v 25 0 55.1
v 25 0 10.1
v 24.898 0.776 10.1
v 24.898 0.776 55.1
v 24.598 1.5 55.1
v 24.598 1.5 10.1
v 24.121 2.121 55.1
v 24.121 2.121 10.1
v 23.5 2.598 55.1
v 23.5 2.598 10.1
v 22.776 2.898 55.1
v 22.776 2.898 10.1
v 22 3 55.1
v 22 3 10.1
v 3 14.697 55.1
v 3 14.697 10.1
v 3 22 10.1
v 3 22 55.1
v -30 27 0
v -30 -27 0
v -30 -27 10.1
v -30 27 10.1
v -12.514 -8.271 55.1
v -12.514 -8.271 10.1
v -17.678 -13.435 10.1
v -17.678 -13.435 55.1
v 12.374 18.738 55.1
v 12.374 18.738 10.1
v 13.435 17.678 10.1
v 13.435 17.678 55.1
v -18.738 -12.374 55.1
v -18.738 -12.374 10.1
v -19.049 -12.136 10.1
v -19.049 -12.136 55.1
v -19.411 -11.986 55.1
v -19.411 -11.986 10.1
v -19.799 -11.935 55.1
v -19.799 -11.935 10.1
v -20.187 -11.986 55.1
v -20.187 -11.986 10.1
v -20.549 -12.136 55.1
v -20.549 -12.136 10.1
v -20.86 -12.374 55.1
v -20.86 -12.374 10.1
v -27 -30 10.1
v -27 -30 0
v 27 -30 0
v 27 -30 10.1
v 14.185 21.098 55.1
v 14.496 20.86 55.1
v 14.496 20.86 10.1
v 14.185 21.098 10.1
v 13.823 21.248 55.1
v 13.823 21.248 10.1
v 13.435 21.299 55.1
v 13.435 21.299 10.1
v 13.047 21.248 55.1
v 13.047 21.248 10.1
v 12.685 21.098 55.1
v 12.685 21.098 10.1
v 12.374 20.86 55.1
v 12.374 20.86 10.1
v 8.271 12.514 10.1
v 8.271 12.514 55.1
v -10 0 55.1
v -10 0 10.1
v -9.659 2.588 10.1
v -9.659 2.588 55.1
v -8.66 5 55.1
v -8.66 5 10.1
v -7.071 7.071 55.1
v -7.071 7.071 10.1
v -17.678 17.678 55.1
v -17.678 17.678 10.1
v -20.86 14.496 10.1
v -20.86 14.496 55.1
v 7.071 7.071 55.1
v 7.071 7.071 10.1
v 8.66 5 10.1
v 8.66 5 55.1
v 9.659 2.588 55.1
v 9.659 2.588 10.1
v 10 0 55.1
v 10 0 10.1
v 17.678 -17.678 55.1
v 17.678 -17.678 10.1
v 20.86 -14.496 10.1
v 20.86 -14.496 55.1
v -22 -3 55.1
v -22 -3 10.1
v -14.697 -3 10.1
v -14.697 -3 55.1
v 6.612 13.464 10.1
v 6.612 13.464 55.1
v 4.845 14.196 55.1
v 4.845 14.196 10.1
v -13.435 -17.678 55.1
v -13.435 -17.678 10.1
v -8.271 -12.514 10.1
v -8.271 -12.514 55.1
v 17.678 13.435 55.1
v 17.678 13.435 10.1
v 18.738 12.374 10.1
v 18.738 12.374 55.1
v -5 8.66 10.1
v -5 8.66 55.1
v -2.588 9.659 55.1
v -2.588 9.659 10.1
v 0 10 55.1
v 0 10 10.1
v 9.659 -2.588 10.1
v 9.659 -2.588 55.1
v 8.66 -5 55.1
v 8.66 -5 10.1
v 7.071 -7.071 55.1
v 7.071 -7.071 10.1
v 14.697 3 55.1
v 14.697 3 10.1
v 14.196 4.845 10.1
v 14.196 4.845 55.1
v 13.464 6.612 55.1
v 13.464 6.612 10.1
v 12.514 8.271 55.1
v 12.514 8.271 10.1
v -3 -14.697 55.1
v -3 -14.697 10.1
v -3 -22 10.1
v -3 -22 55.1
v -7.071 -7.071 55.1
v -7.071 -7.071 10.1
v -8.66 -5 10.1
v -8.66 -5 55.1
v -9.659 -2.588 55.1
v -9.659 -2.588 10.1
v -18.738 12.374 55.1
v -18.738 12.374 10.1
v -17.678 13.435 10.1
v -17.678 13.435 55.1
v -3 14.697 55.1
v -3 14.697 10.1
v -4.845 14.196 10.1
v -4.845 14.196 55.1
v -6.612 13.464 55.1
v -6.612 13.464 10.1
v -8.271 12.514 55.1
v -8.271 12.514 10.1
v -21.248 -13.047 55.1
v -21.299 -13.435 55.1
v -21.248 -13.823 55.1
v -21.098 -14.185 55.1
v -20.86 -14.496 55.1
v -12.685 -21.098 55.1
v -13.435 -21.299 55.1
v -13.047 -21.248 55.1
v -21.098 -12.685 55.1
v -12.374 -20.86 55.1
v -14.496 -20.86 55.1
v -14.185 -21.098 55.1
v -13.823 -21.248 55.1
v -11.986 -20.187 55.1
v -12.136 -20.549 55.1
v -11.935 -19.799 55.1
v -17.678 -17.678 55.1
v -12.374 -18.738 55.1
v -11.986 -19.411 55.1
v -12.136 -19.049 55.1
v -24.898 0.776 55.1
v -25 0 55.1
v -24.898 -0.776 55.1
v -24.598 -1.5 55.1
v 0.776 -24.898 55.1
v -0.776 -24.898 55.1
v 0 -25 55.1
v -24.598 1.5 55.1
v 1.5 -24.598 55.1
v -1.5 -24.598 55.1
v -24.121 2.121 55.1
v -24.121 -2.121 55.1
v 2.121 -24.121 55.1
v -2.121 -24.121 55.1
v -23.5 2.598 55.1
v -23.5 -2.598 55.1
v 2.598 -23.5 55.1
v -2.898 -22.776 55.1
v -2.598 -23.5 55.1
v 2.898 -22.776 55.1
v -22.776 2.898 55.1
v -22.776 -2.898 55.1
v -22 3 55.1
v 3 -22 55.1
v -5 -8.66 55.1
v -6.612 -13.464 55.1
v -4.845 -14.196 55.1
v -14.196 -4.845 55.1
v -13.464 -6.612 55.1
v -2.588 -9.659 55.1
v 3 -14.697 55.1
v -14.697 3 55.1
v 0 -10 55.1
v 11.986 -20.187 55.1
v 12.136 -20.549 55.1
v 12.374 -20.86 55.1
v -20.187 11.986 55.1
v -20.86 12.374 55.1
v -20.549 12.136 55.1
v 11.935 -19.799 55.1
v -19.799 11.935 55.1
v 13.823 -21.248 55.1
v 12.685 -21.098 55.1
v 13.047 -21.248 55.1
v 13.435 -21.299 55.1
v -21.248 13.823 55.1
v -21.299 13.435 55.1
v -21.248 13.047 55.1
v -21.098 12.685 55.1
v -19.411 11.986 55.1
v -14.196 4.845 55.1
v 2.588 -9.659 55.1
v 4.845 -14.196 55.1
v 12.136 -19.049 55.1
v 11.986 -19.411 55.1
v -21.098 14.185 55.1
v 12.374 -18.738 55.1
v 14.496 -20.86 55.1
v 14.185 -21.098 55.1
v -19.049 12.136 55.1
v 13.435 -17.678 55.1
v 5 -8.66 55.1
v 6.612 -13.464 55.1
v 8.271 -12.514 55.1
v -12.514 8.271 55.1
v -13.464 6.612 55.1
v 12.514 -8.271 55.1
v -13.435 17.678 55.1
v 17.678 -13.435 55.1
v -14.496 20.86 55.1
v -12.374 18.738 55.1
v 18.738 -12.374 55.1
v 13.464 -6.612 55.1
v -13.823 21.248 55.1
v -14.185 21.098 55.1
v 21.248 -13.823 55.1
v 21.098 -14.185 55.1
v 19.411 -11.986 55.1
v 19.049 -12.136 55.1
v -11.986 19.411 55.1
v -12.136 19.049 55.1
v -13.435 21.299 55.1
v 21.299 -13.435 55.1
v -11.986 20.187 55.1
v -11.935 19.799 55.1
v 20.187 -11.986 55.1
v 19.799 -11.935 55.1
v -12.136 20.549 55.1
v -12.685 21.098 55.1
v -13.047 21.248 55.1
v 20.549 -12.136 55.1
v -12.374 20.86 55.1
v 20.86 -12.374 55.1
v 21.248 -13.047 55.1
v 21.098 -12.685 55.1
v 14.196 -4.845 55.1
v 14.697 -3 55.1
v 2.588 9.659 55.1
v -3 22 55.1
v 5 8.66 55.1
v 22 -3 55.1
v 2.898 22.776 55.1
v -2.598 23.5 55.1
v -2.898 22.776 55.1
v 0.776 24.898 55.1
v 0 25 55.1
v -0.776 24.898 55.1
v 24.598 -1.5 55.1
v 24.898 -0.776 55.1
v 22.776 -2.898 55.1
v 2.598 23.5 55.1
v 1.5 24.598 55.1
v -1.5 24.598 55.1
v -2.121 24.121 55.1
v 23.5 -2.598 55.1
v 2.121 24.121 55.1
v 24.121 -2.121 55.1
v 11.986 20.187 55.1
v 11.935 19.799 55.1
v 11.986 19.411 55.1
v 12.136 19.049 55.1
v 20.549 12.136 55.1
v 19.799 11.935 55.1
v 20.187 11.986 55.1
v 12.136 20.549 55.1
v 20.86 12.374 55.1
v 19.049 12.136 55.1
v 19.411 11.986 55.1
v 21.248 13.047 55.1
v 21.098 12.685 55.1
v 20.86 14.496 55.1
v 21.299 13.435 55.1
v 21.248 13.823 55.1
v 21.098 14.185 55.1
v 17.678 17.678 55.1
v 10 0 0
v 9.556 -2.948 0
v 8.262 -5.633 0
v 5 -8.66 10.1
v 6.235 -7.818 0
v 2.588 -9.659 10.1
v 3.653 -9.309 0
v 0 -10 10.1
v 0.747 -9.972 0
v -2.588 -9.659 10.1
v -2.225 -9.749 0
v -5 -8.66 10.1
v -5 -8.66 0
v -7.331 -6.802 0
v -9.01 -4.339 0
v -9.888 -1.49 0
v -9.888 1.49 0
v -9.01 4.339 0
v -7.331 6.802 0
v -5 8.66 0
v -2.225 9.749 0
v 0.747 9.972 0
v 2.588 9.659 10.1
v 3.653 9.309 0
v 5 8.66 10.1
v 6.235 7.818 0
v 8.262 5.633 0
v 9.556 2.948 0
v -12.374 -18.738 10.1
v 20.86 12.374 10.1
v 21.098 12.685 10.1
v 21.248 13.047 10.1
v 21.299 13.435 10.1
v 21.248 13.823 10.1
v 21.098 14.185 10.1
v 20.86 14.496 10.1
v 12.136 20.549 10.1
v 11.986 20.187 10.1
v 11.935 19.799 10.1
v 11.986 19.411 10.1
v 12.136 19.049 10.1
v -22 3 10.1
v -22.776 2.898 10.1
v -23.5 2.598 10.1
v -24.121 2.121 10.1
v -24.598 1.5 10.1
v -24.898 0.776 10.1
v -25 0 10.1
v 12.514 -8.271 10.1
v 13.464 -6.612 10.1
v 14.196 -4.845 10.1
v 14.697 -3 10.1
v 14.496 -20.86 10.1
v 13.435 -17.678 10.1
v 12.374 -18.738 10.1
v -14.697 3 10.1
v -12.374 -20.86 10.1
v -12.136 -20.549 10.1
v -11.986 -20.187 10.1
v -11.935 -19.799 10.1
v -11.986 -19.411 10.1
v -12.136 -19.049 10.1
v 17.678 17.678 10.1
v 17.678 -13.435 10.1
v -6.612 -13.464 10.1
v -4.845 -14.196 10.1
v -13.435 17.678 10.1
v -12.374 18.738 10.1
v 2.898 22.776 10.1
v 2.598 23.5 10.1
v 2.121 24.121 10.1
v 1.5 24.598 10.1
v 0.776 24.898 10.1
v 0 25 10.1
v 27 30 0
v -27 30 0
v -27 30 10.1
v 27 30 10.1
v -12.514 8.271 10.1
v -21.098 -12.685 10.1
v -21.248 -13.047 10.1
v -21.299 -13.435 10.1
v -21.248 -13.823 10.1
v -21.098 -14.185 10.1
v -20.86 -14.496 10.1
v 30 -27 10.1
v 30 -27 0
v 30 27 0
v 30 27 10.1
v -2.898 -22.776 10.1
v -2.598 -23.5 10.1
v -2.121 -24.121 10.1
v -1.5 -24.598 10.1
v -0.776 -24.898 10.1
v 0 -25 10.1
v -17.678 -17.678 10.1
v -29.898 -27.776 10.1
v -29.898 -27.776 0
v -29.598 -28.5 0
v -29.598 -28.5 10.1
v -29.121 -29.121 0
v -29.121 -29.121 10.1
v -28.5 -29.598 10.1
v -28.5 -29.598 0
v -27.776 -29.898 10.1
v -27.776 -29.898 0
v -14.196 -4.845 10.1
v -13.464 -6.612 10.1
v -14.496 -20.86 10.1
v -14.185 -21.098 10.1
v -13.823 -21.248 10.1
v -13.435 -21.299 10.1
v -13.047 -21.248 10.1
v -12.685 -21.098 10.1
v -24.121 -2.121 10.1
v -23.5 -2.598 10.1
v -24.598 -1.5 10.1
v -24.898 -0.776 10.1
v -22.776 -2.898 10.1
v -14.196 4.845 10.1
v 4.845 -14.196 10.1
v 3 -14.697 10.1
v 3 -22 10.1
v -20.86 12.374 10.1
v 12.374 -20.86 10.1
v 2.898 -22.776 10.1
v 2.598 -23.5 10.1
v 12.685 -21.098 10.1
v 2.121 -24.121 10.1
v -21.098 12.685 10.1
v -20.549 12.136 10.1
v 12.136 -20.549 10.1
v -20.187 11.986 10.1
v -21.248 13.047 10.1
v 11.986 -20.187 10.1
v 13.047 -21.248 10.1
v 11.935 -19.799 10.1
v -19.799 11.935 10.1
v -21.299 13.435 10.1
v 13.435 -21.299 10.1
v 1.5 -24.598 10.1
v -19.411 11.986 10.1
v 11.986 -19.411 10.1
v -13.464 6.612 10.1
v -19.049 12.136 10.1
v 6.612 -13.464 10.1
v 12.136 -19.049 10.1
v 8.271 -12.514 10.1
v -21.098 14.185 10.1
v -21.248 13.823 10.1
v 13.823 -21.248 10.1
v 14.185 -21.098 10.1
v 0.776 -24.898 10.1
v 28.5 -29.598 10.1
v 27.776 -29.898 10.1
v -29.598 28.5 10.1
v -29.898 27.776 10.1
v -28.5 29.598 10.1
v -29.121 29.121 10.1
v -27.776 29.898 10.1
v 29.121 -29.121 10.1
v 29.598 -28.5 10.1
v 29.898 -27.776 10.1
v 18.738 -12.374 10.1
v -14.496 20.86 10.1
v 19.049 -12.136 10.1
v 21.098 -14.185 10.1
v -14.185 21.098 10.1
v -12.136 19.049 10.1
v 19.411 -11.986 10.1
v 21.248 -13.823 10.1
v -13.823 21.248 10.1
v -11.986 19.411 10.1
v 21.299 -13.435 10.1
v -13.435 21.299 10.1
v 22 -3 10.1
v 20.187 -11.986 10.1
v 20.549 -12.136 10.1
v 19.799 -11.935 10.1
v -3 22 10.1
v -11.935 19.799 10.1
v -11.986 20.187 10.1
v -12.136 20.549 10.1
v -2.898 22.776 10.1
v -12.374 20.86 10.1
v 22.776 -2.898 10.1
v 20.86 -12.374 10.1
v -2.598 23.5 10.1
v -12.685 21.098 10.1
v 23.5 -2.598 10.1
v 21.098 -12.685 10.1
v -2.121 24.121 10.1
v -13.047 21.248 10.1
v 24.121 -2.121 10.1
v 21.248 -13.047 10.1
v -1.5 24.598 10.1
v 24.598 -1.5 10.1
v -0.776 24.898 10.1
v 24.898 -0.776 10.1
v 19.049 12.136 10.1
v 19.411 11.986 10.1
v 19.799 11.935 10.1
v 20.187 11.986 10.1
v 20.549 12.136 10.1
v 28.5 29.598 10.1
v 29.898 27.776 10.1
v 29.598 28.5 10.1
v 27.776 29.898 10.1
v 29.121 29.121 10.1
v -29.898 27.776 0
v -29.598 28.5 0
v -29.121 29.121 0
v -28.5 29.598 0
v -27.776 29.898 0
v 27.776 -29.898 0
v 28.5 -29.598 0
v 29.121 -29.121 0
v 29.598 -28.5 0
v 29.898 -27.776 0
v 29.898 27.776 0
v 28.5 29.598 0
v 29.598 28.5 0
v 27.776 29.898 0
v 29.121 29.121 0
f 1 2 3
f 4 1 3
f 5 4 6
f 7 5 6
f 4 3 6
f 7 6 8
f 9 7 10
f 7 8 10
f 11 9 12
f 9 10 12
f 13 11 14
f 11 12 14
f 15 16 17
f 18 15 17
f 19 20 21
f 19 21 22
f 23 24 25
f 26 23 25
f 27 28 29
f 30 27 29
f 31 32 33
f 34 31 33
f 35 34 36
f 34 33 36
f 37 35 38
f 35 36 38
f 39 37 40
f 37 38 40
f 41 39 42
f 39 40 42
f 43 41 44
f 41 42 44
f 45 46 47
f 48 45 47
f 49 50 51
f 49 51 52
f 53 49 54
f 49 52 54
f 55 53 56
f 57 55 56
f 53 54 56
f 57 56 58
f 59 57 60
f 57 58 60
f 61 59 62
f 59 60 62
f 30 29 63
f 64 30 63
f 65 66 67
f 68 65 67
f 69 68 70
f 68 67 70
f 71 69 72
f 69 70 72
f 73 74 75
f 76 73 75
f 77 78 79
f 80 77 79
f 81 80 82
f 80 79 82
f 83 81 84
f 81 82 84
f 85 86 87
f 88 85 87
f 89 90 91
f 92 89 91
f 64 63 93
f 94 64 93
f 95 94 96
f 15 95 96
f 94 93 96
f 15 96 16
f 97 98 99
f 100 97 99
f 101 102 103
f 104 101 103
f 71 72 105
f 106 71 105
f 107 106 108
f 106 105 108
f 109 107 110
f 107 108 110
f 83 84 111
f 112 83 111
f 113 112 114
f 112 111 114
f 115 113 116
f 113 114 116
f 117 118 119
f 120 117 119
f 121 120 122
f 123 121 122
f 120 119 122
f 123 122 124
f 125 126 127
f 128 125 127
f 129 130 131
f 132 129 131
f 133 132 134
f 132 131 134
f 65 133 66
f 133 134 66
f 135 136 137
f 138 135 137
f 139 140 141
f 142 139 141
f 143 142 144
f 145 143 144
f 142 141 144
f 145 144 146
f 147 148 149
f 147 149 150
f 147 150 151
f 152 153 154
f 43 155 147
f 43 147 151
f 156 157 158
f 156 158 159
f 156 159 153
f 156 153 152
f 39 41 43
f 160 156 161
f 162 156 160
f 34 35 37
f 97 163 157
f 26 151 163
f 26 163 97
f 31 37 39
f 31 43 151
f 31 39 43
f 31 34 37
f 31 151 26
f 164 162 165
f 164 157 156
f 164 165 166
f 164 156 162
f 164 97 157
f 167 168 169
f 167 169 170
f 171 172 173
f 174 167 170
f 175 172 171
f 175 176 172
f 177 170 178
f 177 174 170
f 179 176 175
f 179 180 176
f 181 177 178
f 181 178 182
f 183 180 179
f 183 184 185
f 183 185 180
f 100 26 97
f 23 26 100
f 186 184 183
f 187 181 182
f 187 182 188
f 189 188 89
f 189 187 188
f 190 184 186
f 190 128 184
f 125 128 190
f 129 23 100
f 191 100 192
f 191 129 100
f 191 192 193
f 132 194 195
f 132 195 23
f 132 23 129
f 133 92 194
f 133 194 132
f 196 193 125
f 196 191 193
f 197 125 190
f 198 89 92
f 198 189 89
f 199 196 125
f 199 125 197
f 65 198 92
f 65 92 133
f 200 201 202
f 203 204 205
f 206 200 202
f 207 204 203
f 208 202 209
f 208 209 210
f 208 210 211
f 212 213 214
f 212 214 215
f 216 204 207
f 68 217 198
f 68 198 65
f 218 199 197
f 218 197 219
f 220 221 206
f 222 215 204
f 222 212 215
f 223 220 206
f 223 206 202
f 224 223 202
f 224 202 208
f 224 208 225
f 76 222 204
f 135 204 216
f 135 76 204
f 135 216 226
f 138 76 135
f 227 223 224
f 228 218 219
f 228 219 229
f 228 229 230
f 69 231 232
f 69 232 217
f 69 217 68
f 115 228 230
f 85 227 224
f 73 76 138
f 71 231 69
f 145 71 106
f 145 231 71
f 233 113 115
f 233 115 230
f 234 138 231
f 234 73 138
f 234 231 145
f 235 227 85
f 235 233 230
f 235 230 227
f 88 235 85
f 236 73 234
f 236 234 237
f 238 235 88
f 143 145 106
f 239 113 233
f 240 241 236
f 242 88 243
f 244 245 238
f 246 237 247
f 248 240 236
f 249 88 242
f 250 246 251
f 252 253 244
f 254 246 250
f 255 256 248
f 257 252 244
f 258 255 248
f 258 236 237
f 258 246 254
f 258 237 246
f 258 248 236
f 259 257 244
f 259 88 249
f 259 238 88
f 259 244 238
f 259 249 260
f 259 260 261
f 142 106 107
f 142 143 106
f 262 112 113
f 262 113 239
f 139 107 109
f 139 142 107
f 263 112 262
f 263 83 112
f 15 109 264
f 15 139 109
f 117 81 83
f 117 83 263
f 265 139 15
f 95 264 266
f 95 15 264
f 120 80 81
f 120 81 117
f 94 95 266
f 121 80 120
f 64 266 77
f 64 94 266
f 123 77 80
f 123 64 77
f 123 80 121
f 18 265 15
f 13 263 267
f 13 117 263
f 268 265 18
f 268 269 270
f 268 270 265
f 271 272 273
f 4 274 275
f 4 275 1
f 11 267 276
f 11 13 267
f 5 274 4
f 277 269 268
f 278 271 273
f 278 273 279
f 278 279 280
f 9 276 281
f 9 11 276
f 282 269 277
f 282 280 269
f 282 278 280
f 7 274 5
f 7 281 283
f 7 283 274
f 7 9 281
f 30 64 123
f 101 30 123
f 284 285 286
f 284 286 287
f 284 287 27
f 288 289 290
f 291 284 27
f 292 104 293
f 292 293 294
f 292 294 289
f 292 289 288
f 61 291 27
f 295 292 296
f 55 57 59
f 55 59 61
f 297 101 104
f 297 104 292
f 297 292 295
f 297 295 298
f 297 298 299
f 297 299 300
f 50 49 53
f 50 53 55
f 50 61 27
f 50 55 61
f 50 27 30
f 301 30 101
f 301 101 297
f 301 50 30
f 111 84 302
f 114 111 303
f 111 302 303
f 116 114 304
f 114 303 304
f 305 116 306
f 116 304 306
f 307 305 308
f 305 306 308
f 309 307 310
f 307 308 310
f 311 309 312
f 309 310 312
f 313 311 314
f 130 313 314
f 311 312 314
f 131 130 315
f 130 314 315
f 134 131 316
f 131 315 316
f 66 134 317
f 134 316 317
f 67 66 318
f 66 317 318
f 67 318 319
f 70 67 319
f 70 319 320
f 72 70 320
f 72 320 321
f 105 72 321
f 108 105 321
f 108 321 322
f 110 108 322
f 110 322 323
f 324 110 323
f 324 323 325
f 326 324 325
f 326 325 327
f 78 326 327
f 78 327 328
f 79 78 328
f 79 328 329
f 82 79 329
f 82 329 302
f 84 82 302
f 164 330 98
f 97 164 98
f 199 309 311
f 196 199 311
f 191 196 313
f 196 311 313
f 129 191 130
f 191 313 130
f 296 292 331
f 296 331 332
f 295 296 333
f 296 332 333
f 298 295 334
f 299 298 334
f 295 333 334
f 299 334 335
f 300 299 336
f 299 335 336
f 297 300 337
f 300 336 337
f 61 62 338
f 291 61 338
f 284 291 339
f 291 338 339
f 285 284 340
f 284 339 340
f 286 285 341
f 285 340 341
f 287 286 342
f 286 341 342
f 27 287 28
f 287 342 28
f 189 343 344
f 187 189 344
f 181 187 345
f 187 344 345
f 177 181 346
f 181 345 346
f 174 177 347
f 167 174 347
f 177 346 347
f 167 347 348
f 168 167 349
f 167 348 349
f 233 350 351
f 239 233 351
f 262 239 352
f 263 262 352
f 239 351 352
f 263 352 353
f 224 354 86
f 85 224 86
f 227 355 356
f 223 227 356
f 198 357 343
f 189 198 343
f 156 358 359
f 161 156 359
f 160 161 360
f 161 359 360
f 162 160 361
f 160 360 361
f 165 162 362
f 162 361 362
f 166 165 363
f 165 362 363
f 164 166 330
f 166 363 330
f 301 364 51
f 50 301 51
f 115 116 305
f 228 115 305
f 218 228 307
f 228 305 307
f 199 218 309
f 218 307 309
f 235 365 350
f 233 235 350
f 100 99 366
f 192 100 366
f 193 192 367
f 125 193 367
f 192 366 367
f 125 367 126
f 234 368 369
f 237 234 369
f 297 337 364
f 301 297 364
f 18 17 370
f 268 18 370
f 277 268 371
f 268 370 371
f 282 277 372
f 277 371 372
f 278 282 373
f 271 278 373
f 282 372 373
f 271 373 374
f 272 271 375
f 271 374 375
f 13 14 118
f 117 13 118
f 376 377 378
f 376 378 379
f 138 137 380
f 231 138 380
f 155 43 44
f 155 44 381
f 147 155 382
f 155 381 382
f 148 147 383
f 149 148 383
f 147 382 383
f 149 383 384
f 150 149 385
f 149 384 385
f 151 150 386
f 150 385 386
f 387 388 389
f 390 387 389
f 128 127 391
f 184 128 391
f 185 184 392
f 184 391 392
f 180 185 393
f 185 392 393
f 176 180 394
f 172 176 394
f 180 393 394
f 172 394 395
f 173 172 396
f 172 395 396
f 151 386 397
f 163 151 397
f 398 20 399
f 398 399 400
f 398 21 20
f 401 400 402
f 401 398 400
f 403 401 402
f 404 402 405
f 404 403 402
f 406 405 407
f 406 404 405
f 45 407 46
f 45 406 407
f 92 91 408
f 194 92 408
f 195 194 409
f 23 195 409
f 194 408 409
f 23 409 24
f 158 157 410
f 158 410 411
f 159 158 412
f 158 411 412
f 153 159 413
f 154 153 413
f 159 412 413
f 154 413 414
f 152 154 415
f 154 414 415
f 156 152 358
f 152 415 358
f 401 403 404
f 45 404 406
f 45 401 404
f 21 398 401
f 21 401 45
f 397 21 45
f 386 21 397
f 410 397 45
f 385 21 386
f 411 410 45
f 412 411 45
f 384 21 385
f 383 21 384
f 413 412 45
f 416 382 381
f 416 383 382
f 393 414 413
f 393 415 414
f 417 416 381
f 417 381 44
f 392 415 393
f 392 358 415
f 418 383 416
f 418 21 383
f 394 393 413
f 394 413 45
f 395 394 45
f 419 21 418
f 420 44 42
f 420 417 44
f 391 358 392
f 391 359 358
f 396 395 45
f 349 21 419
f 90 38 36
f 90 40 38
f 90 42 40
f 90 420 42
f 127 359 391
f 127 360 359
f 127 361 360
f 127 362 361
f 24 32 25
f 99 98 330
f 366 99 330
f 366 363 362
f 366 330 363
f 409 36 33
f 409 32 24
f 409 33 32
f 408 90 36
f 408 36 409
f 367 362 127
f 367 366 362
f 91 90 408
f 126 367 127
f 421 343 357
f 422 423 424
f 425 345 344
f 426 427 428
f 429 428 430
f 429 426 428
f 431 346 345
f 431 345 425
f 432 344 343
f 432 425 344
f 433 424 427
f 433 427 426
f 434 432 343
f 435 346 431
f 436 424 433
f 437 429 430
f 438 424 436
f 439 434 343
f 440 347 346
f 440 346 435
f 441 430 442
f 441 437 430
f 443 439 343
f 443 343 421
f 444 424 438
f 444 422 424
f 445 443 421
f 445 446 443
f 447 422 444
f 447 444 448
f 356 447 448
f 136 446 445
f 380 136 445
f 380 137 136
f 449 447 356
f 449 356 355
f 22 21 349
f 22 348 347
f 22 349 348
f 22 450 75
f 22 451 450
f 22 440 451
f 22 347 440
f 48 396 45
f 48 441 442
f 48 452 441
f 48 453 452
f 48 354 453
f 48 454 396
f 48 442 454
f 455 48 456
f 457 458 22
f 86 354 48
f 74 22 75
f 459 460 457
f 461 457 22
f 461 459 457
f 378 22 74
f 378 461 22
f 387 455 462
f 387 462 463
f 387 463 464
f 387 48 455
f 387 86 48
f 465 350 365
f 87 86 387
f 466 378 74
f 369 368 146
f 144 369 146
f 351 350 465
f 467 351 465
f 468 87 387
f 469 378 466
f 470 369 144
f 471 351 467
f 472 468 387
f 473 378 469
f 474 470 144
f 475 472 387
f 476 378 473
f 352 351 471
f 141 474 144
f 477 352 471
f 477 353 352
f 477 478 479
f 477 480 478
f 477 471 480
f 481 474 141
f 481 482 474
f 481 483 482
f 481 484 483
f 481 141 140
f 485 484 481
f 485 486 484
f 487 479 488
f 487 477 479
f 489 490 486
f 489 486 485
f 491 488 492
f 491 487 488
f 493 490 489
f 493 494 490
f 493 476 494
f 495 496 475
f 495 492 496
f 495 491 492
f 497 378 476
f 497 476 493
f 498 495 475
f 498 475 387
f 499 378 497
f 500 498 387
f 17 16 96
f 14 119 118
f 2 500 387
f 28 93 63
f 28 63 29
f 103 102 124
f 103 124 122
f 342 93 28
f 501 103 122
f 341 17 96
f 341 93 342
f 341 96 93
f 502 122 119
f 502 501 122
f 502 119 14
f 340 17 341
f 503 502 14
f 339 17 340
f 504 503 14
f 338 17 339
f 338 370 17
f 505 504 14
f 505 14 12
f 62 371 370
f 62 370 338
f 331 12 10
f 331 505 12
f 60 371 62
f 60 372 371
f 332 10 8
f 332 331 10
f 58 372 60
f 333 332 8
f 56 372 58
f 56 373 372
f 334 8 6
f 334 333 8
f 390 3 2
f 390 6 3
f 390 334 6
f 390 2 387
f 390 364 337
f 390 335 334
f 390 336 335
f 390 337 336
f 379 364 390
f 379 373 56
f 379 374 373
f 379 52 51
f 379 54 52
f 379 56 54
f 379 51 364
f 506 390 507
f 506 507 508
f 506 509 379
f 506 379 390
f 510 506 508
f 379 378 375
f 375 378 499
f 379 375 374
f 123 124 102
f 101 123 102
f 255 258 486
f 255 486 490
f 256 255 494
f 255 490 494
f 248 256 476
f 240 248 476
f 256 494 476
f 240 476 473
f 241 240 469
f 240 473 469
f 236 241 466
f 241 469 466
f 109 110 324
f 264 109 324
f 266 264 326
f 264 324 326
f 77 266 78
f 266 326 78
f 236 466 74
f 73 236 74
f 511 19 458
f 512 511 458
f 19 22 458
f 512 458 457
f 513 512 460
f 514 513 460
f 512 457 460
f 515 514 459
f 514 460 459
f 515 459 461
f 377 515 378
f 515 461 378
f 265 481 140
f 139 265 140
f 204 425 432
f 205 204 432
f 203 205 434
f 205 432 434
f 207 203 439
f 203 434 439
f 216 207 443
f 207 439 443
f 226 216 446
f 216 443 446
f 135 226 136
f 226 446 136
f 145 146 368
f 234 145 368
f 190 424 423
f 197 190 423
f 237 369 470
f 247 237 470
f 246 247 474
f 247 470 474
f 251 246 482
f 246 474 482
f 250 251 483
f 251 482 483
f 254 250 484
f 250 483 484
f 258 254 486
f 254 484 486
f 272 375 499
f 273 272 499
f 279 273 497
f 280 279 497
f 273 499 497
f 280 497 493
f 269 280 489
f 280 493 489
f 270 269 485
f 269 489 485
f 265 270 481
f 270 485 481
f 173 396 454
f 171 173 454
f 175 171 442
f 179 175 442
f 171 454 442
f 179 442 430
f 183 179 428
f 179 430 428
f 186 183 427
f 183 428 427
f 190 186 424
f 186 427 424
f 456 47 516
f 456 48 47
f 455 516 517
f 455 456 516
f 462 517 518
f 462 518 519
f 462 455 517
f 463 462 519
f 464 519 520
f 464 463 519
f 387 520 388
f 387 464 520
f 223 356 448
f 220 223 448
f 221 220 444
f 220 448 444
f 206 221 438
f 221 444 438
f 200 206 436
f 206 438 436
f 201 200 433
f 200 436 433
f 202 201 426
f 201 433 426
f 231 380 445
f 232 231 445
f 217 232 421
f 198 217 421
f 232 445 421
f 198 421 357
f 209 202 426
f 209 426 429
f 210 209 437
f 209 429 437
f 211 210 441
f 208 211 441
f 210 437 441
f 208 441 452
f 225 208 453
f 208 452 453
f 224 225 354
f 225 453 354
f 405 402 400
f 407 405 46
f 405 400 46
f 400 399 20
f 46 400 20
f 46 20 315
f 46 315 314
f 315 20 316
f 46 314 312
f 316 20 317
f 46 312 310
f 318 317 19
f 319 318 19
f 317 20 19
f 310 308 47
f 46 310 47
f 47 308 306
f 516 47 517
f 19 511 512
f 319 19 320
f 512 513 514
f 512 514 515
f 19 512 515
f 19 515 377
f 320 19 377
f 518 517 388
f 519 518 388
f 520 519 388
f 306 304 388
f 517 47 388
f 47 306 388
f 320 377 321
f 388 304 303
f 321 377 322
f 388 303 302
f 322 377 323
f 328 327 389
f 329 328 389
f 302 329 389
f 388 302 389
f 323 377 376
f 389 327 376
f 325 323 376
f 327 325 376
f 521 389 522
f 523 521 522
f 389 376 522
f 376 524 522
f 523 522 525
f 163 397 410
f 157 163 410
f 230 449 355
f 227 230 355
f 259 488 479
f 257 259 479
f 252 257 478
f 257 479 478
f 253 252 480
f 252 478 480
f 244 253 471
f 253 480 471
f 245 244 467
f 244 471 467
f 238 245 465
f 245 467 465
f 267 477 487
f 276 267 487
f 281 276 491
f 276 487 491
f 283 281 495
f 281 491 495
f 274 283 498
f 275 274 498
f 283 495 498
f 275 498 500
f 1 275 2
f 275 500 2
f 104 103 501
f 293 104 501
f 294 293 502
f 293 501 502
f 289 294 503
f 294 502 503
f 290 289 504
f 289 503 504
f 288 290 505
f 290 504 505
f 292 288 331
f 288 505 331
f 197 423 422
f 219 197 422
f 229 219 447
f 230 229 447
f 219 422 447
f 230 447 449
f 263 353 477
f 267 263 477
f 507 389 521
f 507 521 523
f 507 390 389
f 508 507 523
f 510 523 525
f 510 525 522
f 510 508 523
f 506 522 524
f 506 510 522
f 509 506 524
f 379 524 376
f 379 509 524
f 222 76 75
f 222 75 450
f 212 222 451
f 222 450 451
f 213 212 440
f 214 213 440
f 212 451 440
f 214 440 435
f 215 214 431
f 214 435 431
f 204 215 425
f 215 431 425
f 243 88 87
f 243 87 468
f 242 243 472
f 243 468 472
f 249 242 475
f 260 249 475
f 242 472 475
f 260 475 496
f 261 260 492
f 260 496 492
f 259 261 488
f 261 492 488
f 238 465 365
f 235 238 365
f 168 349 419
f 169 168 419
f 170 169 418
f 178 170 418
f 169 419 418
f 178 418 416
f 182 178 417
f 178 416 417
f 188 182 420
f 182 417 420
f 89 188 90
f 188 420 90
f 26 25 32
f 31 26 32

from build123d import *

# Parameters (mm, degrees)
F0_W     = 60
F0_H     = 60
F1_DEPTH = 10.1
F2_R     = 3
F4_DEPTH = 45
F5_R     = 10
F6_DEPTH = 10.1


with BuildPart() as f1:
    # F0 (on Top) → F1 (new body)
    with BuildSketch(Plane.XY):
        Rectangle(F0_W, F0_H)
    extrude(amount=F1_DEPTH)

    # F2
    f2_edges = [f1.edges().sort_by_distance(p)[0] for p in [
        (30, -30, 5.05),
        (30, 30, 5.05),
        (-30, -30, 5.05),
        (-30, 30, 5.05),
    ]]
    fillet(f2_edges, radius=F2_R)

    # F3 (on face) → F4 (join)
    with BuildSketch(Plane.XY.offset(10.1)):
        with BuildLine():
            Line((-17.67767, 13.435029), (-12.513625, 8.270985))
            ThreePointArc((-12.513625, 8.270985), (-13.858193, 5.740251), (-14.696938, 3))
            Line((-14.696938, 3), (-22, 3))
            ThreePointArc((-22, 3), (-24.12132, 2.12132), (-25, 0))
            ThreePointArc((-25, 0), (-24.12132, -2.12132), (-22, -3))
            Line((-22, -3), (-14.696938, -3))
            ThreePointArc((-14.696938, -3), (-13.858193, -5.740251), (-12.513625, -8.270985))
            Line((-12.513625, -8.270985), (-17.67767, -13.435029))
            Line((-17.67767, -13.435029), (-18.73833, -12.374369))
            ThreePointArc((-18.73833, -12.374369), (-19.79899, -11.935029), (-20.85965, -12.374369))
            ThreePointArc((-20.85965, -12.374369), (-21.29899, -13.435029), (-20.85965, -14.495689))
            Line((-20.85965, -14.495689), (-17.67767, -17.67767))
            Line((-17.67767, -17.67767), (-14.495689, -20.85965))
            ThreePointArc((-14.495689, -20.85965), (-13.435029, -21.29899), (-12.374369, -20.85965))
            ThreePointArc((-12.374369, -20.85965), (-11.935029, -19.79899), (-12.374369, -18.73833))
            Line((-12.374369, -18.73833), (-13.435029, -17.67767))
            Line((-13.435029, -17.67767), (-8.270985, -12.513625))
            ThreePointArc((-8.270985, -12.513625), (-5.740251, -13.858193), (-3, -14.696938))
            Line((-3, -14.696938), (-3, -22))
            ThreePointArc((-3, -22), (-2.12132, -24.12132), (0, -25))
            ThreePointArc((0, -25), (2.12132, -24.12132), (3, -22))
            Line((3, -22), (3, -14.696938))
            ThreePointArc((3, -14.696938), (5.740251, -13.858193), (8.270985, -12.513625))
            Line((8.270985, -12.513625), (13.435029, -17.67767))
            Line((13.435029, -17.67767), (12.374369, -18.73833))
            ThreePointArc((12.374369, -18.73833), (11.935029, -19.79899), (12.374369, -20.85965))
            ThreePointArc((12.374369, -20.85965), (13.435029, -21.29899), (14.495689, -20.85965))
            Line((14.495689, -20.85965), (17.67767, -17.67767))
            Line((17.67767, -17.67767), (20.85965, -14.495689))
            ThreePointArc((20.85965, -14.495689), (21.29899, -13.435029), (20.85965, -12.374369))
            ThreePointArc((20.85965, -12.374369), (19.79899, -11.935029), (18.73833, -12.374369))
            Line((18.73833, -12.374369), (17.67767, -13.435029))
            Line((17.67767, -13.435029), (12.513625, -8.270985))
            ThreePointArc((12.513625, -8.270985), (13.858193, -5.740251), (14.696938, -3))
            Line((14.696938, -3), (22, -3))
            ThreePointArc((22, -3), (24.12132, -2.12132), (25, 0))
            ThreePointArc((25, 0), (24.12132, 2.12132), (22, 3))
            Line((22, 3), (14.696938, 3))
            ThreePointArc((14.696938, 3), (13.858193, 5.740251), (12.513625, 8.270985))
            Line((12.513625, 8.270985), (17.67767, 13.435029))
            Line((17.67767, 13.435029), (18.73833, 12.374369))
            ThreePointArc((18.73833, 12.374369), (19.79899, 11.935029), (20.85965, 12.374369))
            ThreePointArc((20.85965, 12.374369), (21.29899, 13.435029), (20.85965, 14.495689))
            Line((20.85965, 14.495689), (17.67767, 17.67767))
            Line((17.67767, 17.67767), (14.495689, 20.85965))
            ThreePointArc((14.495689, 20.85965), (13.435029, 21.29899), (12.374369, 20.85965))
            ThreePointArc((12.374369, 20.85965), (11.935029, 19.79899), (12.374369, 18.73833))
            Line((12.374369, 18.73833), (13.435029, 17.67767))
            Line((13.435029, 17.67767), (8.270985, 12.513625))
            ThreePointArc((8.270985, 12.513625), (5.740251, 13.858193), (3, 14.696938))
            Line((3, 14.696938), (3, 22))
            ThreePointArc((3, 22), (2.12132, 24.12132), (0, 25))
            ThreePointArc((0, 25), (-2.12132, 24.12132), (-3, 22))
            Line((-3, 22), (-3, 14.696938))
            ThreePointArc((-3, 14.696938), (-5.740251, 13.858193), (-8.270985, 12.513625))
            Line((-8.270985, 12.513625), (-13.435029, 17.67767))
            Line((-13.435029, 17.67767), (-12.374369, 18.73833))
            ThreePointArc((-12.374369, 18.73833), (-11.935029, 19.79899), (-12.374369, 20.85965))
            ThreePointArc((-12.374369, 20.85965), (-13.435029, 21.29899), (-14.495689, 20.85965))
            Line((-14.495689, 20.85965), (-17.67767, 17.67767))
            Line((-17.67767, 17.67767), (-20.85965, 14.495689))
            ThreePointArc((-20.85965, 14.495689), (-21.29899, 13.435029), (-20.85965, 12.374369))
            ThreePointArc((-20.85965, 12.374369), (-19.79899, 11.935029), (-18.73833, 12.374369))
            Line((-18.73833, 12.374369), (-17.67767, 13.435029))
        make_face()
        with BuildLine():
            ThreePointArc((-10, 0), (-9.238795, 3.826834), (-7.071068, 7.071068))
            ThreePointArc((-7.071068, 7.071068), (-3.826834, 9.238795), (0, 10))
            ThreePointArc((0, 10), (3.826834, 9.238795), (7.071068, 7.071068))
            ThreePointArc((7.071068, 7.071068), (9.238795, 3.826834), (10, 0))
            ThreePointArc((10, 0), (9.238795, -3.826834), (7.071068, -7.071068))
            ThreePointArc((7.071068, -7.071068), (3.826834, -9.238795), (0, -10))
            ThreePointArc((0, -10), (-3.826834, -9.238795), (-7.071068, -7.071068))
            ThreePointArc((-7.071068, -7.071068), (-9.238795, -3.826834), (-10, 0))
        make_face(mode=Mode.SUBTRACT)
    extrude(amount=F4_DEPTH)

    # F5 (on face) → F6 (cut, through all)
    with BuildSketch(Plane(origin=(0, 0, 0), x_dir=(1, 0, 0), z_dir=(0, 0, -1))):
        Circle(F5_R)
    extrude(amount=-F6_DEPTH, mode=Mode.SUBTRACT)


solid = f1.part
